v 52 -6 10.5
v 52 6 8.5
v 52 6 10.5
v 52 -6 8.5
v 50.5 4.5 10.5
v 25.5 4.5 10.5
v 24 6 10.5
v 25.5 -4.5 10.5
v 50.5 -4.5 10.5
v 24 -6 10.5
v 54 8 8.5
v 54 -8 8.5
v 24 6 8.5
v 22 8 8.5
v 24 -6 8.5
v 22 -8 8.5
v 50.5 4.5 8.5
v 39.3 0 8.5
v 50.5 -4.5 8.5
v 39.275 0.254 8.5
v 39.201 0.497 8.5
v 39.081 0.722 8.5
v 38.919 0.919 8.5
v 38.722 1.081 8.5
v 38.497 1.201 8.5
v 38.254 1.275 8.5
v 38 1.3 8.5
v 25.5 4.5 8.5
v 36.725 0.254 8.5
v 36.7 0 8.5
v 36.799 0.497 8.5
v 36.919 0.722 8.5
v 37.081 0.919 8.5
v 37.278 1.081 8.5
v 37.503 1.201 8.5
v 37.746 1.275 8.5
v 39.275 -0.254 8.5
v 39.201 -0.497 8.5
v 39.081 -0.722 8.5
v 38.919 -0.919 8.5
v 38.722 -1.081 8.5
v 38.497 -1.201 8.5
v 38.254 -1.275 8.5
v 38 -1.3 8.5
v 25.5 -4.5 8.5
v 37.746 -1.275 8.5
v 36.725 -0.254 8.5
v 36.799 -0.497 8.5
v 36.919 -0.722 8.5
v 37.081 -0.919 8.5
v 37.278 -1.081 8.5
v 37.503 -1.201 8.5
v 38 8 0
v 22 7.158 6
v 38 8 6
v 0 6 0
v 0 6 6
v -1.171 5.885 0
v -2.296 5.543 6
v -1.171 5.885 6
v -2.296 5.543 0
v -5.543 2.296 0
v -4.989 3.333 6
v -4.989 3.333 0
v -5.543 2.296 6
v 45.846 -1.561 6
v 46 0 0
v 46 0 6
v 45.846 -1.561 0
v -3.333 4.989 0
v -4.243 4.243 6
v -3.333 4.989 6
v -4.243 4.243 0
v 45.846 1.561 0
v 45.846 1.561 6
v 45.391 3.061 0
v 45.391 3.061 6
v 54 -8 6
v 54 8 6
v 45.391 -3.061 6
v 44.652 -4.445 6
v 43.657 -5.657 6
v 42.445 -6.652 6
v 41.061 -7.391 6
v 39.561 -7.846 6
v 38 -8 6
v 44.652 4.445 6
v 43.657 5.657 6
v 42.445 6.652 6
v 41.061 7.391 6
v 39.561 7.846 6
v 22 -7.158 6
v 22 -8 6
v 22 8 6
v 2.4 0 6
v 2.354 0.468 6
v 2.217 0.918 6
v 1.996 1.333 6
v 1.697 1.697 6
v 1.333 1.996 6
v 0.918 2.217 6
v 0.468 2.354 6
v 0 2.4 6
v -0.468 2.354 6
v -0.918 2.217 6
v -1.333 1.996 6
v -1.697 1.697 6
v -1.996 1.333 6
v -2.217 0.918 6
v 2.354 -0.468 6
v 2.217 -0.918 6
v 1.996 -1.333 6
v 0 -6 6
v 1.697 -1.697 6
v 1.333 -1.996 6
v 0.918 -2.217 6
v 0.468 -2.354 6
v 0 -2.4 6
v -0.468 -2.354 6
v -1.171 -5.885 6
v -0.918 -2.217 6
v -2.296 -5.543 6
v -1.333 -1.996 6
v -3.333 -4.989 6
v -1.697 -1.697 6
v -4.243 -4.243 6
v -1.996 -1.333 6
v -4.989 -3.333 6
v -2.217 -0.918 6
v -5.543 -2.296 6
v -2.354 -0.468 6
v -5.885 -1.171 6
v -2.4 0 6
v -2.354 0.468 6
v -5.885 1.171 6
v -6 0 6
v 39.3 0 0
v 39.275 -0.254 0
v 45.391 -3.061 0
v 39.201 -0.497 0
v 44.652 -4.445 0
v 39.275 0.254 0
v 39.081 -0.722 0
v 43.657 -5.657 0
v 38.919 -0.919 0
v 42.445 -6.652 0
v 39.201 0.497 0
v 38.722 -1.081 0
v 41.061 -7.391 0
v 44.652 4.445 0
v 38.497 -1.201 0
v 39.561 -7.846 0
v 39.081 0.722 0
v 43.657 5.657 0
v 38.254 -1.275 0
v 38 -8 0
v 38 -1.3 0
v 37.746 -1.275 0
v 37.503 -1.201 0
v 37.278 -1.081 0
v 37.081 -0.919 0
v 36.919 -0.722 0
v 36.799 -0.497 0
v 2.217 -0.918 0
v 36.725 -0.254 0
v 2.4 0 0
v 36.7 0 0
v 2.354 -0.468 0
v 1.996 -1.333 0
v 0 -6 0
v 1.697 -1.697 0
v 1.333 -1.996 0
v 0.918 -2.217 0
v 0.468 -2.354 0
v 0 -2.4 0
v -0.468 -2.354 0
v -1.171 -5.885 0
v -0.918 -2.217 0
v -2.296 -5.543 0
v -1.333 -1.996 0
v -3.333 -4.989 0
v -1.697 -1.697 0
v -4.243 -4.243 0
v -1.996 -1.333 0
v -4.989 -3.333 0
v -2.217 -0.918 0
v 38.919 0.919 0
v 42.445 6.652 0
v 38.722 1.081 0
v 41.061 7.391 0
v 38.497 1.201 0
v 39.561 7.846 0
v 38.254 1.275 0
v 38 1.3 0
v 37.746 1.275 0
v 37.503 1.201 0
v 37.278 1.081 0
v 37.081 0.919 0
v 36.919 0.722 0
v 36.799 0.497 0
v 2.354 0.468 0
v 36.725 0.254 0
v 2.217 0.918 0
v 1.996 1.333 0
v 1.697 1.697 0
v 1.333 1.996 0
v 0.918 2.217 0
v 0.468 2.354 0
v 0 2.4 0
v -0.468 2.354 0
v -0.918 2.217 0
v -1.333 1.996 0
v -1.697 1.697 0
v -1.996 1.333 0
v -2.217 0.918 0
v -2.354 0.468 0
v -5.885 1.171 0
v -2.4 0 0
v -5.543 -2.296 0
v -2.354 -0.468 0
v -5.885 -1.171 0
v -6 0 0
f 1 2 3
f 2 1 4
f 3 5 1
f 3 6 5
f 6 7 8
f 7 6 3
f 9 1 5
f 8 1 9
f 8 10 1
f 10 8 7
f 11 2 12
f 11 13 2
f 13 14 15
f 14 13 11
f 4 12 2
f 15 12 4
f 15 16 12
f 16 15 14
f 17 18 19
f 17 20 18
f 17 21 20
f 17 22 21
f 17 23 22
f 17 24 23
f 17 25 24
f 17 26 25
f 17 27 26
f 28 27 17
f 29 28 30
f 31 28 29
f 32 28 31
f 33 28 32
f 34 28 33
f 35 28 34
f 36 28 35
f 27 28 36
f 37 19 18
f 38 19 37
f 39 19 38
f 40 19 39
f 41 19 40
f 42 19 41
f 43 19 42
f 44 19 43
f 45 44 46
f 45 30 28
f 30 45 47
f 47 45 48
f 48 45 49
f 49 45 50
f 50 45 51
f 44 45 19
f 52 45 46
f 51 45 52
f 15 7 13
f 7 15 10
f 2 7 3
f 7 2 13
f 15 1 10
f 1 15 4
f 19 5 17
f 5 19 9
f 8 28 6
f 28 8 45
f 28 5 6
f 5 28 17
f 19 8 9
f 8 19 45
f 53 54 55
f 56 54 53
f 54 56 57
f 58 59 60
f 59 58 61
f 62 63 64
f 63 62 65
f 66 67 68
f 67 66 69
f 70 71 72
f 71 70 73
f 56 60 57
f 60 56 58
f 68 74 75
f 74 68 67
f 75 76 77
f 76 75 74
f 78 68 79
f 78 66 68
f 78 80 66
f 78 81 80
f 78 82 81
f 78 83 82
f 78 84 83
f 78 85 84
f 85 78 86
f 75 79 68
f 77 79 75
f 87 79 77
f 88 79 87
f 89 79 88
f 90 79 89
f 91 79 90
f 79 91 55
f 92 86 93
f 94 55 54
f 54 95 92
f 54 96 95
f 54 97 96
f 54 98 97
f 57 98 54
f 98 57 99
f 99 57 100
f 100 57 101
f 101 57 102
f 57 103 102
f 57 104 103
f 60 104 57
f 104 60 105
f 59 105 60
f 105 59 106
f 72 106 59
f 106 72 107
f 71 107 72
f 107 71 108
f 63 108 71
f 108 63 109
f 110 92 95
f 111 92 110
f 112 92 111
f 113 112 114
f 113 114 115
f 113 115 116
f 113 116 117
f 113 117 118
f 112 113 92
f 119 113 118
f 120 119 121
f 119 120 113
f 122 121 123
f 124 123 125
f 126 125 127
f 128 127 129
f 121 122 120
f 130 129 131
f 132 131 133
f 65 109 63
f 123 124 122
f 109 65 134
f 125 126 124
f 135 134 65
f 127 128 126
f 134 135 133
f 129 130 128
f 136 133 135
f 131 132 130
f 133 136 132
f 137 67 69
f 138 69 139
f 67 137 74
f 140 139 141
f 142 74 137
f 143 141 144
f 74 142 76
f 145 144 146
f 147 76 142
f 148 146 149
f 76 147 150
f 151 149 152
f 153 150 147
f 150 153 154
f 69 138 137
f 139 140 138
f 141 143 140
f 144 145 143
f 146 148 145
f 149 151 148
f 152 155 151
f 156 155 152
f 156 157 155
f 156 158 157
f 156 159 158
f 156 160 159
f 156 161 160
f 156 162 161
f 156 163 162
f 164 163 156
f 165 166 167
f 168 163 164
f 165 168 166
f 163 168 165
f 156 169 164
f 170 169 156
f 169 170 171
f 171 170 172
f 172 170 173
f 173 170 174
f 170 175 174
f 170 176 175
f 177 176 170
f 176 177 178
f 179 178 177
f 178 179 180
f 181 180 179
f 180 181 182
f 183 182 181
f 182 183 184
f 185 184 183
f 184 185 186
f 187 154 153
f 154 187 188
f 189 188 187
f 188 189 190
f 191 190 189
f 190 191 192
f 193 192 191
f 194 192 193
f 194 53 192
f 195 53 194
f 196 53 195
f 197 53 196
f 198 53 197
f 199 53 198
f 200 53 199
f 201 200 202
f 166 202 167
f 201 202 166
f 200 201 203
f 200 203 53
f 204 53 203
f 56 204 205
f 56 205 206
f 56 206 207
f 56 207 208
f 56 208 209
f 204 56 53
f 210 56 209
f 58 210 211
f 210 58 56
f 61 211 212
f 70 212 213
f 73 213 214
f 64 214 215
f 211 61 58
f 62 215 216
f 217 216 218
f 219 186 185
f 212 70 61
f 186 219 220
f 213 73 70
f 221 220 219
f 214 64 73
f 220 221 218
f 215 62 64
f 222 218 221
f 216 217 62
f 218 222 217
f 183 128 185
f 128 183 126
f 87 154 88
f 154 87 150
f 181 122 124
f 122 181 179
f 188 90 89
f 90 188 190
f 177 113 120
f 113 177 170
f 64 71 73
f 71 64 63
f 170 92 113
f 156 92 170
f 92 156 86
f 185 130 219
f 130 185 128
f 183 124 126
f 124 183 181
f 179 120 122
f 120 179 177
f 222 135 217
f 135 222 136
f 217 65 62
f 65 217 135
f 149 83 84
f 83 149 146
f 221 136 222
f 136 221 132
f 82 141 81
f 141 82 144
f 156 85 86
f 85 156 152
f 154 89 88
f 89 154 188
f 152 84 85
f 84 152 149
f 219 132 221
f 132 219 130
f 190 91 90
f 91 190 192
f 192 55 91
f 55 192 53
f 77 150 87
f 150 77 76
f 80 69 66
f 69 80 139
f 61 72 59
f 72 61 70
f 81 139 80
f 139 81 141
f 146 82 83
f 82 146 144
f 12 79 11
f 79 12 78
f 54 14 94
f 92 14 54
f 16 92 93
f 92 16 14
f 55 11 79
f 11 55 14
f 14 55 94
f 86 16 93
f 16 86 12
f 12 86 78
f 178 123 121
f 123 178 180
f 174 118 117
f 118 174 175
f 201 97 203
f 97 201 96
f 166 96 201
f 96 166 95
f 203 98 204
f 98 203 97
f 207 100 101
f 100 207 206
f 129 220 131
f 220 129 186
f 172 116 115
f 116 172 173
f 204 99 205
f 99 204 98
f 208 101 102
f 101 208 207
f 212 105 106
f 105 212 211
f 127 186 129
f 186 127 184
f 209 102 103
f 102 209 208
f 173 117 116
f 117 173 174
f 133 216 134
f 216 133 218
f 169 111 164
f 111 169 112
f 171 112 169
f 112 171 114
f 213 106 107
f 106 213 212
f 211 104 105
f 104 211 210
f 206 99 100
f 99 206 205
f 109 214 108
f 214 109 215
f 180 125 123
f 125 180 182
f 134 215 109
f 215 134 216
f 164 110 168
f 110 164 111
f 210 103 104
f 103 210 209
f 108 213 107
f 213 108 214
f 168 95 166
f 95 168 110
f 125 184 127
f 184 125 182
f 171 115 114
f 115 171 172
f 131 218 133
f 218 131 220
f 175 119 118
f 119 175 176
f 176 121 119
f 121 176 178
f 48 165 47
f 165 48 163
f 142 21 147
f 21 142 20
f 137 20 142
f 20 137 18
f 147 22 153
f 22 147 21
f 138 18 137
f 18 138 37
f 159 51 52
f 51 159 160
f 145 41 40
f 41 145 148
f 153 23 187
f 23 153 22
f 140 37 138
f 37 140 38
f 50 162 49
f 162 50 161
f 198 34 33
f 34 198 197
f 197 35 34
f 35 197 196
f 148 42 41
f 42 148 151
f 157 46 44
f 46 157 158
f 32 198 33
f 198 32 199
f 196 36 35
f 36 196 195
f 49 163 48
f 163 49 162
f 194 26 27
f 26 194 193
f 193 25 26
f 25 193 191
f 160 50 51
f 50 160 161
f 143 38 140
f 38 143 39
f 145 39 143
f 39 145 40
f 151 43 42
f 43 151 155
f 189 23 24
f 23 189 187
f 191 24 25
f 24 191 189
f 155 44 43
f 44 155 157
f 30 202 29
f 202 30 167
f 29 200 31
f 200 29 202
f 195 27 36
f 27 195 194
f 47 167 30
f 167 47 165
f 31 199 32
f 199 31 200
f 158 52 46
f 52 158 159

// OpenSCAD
// PROJECT W.A.L.L. - HYPER-ACTUATOR Mk-1: Motorized Auto-Sealing Capping & Purge Dock
// Drawing Ref: DWG-WALL-HACT-006 | Material: PETG (Arm) & Platinum Silicone (Capping Boot)
// Actuated by 9g Micro-Servo. Hermetically Seals 128-Nozzle Orifice Plate During Pauses.
// Complies with ISO 2768-mK tolerances | Designed for FDM 3D Printing

$fn = 32;

module auto_capping_station(
    arm_len = 38.0,
    arm_w = 14.0,
    arm_t = 6.0,
    cap_w = 16.0,
    cap_l = 32.0,
    servo_spline_d = 4.8
) {
    difference() {
        union() {
            // Main Articulated Servo Swing-Arm
            hull() {
                cylinder(d=12.0, h=arm_t);
                translate([arm_len, 0, 0])
                    cylinder(d=cap_w, h=arm_t);
            }

            // Distal Silicone Boot Retention Rim
            translate([arm_len - cap_l/2, -cap_w/2, arm_t])
                cube([cap_l, cap_w, 2.5]);

            // Perimeter Sealing Lip Boss
            translate([arm_len - (cap_l-4)/2, -(cap_w-4)/2, arm_t + 2.5])
                difference() {
                    cube([cap_l - 4, cap_w - 4, 2.0]);
                    translate([1.5, 1.5, -0.5])
                        cube([cap_l - 7, cap_w - 7, 3.0]);
                }
        }

        // 1. 9g Metal Gear Servo 21T Micro-Spline Bore
        translate([0, 0, -1])
            cylinder(d=servo_spline_d, h=arm_t + 2);

        // 2. Waste Ink Drain Port
        translate([arm_len, 0, -1])
            cylinder(d=2.6, h=arm_t + 6.0);
    }
}

auto_capping_station();
